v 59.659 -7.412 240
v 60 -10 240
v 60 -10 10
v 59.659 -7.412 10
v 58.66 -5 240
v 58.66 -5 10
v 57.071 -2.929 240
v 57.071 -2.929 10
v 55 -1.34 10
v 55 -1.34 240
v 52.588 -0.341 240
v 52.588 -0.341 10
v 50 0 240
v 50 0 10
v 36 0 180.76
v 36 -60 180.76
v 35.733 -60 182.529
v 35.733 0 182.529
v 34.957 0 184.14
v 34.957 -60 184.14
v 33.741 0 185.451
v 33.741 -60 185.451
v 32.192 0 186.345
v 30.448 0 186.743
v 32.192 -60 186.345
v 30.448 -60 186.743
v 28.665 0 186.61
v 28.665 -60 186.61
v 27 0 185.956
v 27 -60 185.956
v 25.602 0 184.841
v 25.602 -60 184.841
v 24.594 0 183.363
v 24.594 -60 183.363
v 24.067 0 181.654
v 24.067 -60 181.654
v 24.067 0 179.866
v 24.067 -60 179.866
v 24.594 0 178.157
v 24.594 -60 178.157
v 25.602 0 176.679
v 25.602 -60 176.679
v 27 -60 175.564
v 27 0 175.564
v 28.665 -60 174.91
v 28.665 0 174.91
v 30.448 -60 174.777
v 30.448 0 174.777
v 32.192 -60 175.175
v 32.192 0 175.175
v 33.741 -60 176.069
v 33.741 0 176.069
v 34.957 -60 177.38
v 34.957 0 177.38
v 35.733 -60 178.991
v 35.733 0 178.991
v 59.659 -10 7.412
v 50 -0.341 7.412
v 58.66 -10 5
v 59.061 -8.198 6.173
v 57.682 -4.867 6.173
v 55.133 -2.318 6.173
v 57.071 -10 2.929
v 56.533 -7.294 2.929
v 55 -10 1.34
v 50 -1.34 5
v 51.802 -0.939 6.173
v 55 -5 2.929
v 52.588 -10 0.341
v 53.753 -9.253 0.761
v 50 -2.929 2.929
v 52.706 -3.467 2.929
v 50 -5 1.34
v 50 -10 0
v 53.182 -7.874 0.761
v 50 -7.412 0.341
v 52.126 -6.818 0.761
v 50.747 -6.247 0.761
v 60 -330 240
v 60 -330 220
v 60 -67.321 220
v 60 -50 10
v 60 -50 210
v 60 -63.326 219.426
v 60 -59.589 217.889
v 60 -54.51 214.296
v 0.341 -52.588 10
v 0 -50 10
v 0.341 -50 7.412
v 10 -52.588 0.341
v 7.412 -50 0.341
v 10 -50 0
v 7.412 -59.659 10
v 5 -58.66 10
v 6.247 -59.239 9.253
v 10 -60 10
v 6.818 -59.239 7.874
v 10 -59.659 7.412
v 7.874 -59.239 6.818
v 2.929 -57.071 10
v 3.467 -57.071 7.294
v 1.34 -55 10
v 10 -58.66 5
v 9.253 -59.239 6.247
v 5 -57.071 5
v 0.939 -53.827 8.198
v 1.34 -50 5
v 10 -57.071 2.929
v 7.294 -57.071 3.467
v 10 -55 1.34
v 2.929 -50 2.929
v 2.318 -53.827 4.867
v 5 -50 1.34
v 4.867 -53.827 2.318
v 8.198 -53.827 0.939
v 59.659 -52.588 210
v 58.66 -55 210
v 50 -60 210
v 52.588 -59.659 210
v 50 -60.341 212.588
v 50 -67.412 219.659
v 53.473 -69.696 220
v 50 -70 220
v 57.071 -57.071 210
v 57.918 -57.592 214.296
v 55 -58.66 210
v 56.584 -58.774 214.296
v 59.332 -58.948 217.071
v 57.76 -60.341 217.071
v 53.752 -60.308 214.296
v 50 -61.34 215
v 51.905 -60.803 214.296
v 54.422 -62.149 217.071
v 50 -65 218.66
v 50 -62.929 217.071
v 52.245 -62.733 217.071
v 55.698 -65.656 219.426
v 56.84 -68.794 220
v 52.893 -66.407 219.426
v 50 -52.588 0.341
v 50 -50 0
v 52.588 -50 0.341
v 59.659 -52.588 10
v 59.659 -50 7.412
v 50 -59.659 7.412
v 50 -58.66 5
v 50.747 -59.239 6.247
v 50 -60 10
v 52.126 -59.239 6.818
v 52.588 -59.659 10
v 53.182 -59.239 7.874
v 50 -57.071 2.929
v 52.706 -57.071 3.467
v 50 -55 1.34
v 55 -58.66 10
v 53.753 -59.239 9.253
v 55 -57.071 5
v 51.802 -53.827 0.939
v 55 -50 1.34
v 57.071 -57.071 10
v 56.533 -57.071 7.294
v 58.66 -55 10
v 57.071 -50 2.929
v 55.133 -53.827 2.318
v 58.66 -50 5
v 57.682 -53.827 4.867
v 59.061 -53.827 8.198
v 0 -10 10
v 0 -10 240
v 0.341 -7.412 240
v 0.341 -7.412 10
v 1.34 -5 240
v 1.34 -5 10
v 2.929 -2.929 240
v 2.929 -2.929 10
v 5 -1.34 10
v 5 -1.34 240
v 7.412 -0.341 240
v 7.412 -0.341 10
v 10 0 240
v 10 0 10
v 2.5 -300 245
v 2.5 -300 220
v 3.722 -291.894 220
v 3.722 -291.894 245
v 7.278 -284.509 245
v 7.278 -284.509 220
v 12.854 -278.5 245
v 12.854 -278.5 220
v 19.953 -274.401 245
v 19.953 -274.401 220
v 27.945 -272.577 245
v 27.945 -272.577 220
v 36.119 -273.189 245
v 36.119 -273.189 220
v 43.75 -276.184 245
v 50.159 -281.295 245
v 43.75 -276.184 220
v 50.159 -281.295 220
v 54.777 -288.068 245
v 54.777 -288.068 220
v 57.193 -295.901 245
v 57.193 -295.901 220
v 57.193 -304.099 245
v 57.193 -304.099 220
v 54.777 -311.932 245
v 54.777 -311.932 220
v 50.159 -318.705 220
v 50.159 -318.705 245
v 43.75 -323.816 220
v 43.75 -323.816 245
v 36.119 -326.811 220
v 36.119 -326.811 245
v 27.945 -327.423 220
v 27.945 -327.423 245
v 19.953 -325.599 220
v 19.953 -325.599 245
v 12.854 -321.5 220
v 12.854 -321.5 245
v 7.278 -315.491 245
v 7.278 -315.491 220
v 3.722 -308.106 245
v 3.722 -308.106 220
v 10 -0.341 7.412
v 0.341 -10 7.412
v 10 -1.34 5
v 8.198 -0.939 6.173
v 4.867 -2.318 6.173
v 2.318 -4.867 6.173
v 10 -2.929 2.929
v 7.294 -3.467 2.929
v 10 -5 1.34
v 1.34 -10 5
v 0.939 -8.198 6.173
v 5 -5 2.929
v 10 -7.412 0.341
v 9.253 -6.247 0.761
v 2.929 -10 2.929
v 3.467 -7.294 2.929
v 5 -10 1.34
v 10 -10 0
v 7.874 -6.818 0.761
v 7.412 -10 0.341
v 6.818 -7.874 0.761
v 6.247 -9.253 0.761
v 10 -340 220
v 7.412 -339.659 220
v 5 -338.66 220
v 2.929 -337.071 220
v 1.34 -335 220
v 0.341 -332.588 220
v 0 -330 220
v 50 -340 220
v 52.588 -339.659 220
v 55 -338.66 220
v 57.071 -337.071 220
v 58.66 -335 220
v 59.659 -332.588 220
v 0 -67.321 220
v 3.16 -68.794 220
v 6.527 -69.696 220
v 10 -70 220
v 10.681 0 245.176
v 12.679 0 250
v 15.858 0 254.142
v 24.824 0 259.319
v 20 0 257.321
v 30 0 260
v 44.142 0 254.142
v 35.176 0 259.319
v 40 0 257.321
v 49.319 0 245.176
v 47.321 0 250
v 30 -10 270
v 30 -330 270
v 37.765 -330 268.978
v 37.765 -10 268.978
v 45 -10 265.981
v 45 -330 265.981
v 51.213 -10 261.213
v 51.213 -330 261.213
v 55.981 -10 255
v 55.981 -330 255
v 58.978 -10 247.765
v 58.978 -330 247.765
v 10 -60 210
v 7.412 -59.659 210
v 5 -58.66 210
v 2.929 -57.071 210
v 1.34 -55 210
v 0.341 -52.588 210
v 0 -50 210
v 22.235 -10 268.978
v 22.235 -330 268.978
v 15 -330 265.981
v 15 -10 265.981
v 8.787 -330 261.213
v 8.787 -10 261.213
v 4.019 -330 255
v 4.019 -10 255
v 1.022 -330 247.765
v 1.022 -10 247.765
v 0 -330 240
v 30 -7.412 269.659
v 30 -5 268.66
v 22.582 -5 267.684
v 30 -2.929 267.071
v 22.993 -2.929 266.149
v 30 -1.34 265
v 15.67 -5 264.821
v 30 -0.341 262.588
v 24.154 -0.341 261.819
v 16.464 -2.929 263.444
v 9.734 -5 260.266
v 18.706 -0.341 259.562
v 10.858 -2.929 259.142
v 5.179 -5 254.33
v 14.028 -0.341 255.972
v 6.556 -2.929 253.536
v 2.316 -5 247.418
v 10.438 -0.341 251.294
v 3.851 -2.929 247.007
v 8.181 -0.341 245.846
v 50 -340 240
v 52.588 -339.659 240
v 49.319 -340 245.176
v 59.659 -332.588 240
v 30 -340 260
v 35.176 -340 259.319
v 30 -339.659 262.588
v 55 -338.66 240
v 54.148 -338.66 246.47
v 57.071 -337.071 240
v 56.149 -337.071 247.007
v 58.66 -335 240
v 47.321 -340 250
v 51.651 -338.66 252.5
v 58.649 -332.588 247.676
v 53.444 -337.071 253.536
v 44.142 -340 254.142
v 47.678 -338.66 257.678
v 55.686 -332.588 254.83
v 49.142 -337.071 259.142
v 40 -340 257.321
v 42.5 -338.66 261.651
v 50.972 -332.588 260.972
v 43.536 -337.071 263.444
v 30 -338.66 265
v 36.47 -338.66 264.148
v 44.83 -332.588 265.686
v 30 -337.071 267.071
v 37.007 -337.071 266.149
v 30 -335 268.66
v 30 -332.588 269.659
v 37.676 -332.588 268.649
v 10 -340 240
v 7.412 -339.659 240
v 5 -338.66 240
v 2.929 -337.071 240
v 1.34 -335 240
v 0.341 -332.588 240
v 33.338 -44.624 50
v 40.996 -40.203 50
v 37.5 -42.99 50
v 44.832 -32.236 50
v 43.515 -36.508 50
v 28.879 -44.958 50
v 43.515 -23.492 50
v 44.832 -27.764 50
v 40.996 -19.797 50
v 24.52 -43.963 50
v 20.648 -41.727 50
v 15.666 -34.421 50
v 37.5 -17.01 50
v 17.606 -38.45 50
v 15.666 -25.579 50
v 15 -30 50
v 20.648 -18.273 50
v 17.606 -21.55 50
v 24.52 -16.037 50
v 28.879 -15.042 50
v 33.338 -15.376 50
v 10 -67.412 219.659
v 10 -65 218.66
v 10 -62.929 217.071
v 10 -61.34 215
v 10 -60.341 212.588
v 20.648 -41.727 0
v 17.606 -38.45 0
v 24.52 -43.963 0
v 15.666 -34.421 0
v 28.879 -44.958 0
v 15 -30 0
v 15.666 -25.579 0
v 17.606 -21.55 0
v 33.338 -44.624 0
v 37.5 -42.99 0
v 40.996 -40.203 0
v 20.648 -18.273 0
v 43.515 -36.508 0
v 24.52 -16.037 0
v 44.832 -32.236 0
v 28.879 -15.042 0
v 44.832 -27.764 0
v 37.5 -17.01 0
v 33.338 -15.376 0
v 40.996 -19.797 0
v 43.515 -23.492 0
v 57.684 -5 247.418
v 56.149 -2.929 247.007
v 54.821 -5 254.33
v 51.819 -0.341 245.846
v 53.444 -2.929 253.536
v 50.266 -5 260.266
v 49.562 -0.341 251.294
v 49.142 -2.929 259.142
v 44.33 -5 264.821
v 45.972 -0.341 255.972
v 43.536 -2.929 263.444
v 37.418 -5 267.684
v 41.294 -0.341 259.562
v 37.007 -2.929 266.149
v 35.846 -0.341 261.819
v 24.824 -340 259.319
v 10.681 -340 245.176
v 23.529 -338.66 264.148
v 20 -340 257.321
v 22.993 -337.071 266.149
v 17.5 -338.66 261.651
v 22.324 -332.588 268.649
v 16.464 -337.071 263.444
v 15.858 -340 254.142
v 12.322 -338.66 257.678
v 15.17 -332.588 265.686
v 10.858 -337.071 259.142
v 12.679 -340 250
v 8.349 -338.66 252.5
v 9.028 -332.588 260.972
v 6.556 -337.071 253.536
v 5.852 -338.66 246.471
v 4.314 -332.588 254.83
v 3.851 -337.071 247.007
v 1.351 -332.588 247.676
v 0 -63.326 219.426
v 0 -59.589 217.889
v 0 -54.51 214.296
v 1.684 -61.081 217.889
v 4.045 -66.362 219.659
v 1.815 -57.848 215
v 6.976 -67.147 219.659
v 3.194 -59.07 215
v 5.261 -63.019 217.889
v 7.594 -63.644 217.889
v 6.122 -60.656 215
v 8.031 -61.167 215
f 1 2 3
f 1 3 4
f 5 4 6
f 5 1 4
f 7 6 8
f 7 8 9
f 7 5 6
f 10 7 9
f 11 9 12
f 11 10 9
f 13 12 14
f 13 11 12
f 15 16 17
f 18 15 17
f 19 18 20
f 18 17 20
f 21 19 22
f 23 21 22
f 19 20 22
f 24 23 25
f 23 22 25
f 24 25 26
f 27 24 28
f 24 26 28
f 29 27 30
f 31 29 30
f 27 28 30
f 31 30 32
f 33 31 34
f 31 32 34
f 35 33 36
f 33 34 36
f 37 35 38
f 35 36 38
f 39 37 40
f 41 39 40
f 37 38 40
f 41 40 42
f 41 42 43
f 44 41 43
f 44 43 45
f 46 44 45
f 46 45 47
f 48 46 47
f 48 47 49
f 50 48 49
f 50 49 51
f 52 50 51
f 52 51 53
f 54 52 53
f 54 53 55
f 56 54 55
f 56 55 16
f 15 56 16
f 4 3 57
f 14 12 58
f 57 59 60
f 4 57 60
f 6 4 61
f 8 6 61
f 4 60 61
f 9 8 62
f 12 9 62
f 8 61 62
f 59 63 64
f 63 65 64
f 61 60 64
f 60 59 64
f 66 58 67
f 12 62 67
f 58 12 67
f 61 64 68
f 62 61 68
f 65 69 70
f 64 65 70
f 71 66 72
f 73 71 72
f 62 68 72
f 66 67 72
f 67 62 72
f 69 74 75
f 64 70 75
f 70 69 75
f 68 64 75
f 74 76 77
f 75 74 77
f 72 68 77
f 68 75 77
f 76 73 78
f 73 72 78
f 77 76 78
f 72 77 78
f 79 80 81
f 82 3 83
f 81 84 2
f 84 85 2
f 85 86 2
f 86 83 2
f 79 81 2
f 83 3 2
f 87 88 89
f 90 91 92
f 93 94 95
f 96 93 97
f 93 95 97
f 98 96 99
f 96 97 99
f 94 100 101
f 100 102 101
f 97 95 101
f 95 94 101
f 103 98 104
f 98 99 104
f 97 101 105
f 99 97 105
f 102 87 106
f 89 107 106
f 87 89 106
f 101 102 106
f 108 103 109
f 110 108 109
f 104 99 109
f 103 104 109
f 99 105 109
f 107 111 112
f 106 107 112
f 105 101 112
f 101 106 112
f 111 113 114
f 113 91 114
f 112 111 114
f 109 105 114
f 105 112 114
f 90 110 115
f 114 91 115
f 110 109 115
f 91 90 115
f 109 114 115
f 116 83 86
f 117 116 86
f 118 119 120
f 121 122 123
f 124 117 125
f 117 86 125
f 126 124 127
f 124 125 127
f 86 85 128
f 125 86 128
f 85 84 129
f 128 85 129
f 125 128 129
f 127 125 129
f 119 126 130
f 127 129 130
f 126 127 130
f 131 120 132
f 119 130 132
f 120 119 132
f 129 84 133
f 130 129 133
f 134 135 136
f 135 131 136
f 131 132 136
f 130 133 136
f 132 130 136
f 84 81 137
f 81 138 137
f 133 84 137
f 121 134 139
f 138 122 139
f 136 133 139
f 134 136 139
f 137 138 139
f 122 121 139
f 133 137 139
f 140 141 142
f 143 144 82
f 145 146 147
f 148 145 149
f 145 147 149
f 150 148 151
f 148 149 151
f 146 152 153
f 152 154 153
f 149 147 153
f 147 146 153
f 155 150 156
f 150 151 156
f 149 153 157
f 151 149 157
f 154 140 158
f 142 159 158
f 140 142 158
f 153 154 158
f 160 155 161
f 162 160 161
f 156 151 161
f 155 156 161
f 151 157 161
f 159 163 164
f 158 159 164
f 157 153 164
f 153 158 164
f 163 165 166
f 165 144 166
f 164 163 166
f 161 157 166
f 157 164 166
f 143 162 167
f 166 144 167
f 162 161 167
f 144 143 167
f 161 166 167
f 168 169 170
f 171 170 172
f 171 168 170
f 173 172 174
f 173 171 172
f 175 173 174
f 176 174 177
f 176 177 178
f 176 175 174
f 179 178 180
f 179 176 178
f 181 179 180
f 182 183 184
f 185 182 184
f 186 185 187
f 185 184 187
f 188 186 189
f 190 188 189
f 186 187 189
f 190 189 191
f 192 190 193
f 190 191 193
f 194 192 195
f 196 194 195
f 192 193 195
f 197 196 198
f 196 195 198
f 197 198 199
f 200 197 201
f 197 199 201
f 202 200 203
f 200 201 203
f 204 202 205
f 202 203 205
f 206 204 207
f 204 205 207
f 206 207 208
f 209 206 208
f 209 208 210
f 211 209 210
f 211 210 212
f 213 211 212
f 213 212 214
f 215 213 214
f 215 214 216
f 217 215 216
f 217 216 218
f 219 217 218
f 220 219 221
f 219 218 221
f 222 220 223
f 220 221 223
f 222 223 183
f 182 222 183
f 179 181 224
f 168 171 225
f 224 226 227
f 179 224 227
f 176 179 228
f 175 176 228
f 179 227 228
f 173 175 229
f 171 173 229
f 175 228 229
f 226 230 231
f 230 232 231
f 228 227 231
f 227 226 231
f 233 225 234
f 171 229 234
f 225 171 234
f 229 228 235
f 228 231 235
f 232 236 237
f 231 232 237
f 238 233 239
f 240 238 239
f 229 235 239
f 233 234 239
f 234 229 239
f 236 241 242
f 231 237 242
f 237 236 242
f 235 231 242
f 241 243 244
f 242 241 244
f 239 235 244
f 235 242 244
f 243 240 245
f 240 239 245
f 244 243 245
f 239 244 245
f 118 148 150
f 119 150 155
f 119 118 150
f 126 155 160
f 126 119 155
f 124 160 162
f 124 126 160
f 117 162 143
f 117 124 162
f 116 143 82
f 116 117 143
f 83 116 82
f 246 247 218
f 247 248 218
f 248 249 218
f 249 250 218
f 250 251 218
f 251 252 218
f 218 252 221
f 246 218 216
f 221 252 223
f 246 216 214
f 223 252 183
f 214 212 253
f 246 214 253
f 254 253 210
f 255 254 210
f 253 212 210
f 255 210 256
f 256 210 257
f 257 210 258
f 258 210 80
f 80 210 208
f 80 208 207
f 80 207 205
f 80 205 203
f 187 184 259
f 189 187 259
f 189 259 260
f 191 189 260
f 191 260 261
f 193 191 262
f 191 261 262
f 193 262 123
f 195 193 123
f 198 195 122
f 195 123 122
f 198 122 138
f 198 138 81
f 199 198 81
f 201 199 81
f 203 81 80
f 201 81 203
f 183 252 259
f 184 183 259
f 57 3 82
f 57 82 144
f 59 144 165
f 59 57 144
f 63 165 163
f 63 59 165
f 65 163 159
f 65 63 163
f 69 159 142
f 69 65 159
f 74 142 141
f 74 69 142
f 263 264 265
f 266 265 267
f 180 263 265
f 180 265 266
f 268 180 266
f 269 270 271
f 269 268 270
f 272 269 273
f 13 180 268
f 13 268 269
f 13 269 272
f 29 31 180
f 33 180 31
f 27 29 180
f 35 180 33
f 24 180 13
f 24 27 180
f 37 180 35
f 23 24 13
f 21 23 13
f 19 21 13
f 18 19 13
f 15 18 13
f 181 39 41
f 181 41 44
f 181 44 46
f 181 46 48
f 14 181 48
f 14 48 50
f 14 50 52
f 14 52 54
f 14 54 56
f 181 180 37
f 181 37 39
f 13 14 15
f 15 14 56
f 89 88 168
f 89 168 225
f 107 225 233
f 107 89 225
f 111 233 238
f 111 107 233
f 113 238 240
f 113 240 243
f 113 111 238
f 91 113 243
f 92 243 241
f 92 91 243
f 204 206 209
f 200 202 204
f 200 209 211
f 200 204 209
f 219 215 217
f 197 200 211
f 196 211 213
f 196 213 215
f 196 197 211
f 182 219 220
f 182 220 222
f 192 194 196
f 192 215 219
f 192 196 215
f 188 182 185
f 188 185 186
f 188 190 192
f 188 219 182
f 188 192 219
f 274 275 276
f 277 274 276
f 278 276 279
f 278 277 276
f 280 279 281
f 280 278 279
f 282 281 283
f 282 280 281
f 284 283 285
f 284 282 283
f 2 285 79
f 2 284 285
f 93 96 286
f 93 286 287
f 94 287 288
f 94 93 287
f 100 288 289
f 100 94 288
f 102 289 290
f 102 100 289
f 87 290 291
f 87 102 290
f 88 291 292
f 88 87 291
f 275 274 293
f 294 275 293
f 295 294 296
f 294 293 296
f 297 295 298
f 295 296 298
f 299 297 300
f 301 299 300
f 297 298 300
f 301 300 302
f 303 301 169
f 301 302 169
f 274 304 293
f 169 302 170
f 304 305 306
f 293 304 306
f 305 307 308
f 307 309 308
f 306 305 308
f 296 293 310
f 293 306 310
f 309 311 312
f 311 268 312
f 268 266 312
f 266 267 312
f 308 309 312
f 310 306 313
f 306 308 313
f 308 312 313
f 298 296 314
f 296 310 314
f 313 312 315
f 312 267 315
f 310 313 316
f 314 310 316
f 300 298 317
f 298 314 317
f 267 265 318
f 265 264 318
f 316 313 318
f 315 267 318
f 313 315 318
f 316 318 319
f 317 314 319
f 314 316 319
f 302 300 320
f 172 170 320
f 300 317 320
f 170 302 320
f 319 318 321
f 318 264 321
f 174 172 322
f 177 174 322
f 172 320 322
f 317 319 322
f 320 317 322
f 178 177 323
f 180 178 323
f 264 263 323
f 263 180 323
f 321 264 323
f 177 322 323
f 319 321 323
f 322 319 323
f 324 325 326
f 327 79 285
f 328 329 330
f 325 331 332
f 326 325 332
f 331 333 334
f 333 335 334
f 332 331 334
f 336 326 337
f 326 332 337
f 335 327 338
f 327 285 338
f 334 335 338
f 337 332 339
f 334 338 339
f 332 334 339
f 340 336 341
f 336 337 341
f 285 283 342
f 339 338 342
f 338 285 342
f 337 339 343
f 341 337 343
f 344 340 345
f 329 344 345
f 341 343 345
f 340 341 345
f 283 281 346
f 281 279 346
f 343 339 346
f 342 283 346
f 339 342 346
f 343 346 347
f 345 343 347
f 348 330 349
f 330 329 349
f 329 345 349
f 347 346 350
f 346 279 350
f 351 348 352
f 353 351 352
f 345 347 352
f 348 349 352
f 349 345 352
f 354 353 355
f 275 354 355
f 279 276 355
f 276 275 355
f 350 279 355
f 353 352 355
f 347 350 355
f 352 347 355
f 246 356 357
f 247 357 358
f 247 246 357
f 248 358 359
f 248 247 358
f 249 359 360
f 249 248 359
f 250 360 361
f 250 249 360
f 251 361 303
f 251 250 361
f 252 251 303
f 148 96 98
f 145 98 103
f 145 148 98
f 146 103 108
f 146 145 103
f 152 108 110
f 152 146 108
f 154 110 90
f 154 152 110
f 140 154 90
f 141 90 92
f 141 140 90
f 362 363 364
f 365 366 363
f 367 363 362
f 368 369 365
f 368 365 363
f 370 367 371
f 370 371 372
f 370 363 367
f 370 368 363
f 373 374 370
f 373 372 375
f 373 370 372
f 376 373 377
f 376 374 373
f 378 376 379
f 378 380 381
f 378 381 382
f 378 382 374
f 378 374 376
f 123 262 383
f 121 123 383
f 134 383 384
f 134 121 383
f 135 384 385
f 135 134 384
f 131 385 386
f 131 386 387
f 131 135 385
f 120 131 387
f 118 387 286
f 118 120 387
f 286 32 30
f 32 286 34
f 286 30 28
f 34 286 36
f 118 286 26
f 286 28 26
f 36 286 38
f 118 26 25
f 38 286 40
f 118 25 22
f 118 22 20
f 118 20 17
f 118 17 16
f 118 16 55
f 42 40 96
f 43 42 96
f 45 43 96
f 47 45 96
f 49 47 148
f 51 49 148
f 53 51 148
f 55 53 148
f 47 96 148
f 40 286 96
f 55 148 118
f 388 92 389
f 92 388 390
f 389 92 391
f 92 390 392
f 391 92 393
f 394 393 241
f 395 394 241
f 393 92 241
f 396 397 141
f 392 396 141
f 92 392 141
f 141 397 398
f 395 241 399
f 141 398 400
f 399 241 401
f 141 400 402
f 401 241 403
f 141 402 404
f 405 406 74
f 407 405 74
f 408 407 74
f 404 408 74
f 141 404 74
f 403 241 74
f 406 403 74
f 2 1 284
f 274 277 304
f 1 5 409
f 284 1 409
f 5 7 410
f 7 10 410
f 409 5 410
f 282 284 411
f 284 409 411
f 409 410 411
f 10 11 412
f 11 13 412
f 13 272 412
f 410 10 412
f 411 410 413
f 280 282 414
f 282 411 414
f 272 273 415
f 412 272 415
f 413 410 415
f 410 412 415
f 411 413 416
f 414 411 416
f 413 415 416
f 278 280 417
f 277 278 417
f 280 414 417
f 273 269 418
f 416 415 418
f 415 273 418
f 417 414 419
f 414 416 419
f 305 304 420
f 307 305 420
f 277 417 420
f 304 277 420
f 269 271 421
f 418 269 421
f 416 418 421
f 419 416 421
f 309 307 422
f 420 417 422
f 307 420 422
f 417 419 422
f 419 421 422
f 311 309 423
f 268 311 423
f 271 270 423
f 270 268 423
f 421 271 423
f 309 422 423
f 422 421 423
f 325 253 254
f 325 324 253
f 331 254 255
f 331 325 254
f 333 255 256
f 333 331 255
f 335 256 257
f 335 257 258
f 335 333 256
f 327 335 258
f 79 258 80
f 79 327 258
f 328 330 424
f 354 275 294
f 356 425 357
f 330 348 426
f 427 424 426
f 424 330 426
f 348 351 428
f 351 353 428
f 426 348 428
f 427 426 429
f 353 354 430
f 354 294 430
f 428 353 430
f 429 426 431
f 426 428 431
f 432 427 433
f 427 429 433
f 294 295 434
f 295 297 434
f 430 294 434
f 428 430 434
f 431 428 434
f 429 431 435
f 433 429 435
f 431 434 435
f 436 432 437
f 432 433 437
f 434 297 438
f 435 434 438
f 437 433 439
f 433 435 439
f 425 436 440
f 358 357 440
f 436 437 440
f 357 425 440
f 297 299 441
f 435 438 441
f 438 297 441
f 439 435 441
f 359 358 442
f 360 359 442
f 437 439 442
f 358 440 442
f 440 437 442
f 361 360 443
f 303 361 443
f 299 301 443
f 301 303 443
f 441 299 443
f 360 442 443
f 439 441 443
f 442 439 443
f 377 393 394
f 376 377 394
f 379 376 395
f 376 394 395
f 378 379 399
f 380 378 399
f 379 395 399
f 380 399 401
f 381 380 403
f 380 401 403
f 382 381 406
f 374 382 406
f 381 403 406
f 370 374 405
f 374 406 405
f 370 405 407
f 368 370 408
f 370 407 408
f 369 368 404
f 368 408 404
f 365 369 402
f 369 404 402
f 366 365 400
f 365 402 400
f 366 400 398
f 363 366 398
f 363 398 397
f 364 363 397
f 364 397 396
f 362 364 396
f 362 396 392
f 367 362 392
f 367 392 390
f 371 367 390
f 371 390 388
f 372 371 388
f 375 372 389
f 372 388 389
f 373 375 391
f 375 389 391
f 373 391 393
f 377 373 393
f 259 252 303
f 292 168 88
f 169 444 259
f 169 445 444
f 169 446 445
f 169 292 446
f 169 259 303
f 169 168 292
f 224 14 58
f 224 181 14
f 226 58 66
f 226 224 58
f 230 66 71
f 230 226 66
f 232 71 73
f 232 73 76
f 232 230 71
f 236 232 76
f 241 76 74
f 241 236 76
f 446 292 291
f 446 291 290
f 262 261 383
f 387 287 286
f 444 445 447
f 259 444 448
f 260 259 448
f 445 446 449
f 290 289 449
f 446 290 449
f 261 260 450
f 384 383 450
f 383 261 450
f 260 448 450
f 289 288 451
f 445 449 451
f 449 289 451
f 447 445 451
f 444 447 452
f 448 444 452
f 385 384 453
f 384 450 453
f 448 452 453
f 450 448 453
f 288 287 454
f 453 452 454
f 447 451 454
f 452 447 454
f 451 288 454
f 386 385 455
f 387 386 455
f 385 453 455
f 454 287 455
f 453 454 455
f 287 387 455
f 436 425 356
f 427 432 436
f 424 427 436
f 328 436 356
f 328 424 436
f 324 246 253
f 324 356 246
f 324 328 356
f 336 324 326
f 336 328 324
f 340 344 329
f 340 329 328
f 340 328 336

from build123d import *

# Parameters (mm, degrees)
SKETCH1_W           = 60
SKETCH1_H           = 60
BOSS_EXTRUDE1_DEPTH = 270
SKETCH2_W           = 60
SKETCH2_H           = 50
BOSS_EXTRUDE2_DEPTH = 280
SKETCH3_R           = 15
CUT_EXTRUDE1_DEPTH  = 50
SKETCH4_R           = 27.5
CUT_EXTRUDE2_DEPTH  = 25
FILLET1_R           = 30
FILLET2_R           = 30
FILLET3_R           = 10
FILLET4_R           = 10
FILLET5_R           = 10
FILLET6_R           = 10
FILLET7_R           = 10
SKETCH5_R           = 6
CUT_EXTRUDE4_DEPTH  = 394.573373167


# Some blends are built 0.0001 mm under size
with BuildPart() as part:
    # Sketch1 → Boss-Extrude1 (new body)
    with BuildSketch(Plane.XY):
        with Locations((30, -30)):
            Rectangle(SKETCH1_W, SKETCH1_H)
    extrude(amount=BOSS_EXTRUDE1_DEPTH)

    # Sketch2 → Boss-Extrude2 (add)
    with BuildSketch(Plane.XZ.offset(60)):
        with Locations((30, 245)):
            Rectangle(SKETCH2_W, SKETCH2_H)
    extrude(amount=BOSS_EXTRUDE2_DEPTH)

    # Sketch3 → Cut-Extrude1 (cut)
    with BuildSketch(Plane(origin=(0, 0, 0), x_dir=(-1, 0, 0), z_dir=(0, 0, -1))):
        with Locations((-30, -30)):
            Circle(SKETCH3_R)
    extrude(amount=-CUT_EXTRUDE1_DEPTH, mode=Mode.SUBTRACT)

    # Sketch4 → Cut-Extrude2 (cut)
    with BuildSketch(Plane(origin=(0, 0, 220), x_dir=(-1, 0, 0), z_dir=(0, 0, -1))):
        with Locations((-30, -300)):
            Circle(SKETCH4_R)
    extrude(amount=-CUT_EXTRUDE2_DEPTH, mode=Mode.SUBTRACT)

    # Fillet1
    fillet1_edges = [part.edges().sort_by_distance(p)[0] for p in [
        (60, -170, 270),
    ]]
    fillet(fillet1_edges, radius=FILLET1_R)

    # Fillet2
    fillet2_edges = [part.edges().sort_by_distance(p)[0] for p in [
        (0, -170, 270),
    ]]
    fillet(fillet2_edges, radius=FILLET2_R - 0.0001)  # a hair under: the kernel refuses the full size

    # Fillet3
    fillet3_edges = [part.edges().sort_by_distance(p)[0] for p in [
        (60, 0, 120),
        (51.213203436, 0, 261.213203436),
        (0, 0, 120.00005),
        (8.786767275, 0, 261.213232725),
    ]]
    fillet(fillet3_edges, radius=FILLET3_R)

    # Fillet4
    fillet4_edges = [part.edges().sort_by_distance(p)[0] for p in [
        (60, -35, 0),
        (30, 0, 0),
        (0, -35, 0),
        (2.928932188, -2.928932188, 0),
        (57.071067812, -2.928932188, 0),
    ]]
    fillet(fillet4_edges, radius=FILLET4_R)

    # Fillet5
    fillet5_edges = [part.edges().sort_by_distance(p)[0] for p in [
        (60, -60, 115),
        (0, -60, 115),
        (30, -60, 0),
        (2.928932188, -60, 2.928932188),
        (57.071067812, -60, 2.928932188),
    ]]
    fillet(fillet5_edges, radius=FILLET5_R)

    # Fillet6
    # the kernel refuses this fillet: 10 mm, written as the material it adds along each edge
    with BuildSketch(Plane(origin=(50, -60, 220), x_dir=(0, 0, -1), z_dir=(-1, 0, 0))) as fillet6_piece_1:
        with BuildLine():
            CenterArc((FILLET6_R, FILLET6_R), FILLET6_R, 180, 90)
            Line((0, FILLET6_R), (0, 0))
            Line((0, 0), (FILLET6_R, 0))
        make_face()
    extrude(amount=40)
    with BuildSketch(Plane(origin=(50, -50, 220), x_dir=(-0.8017442392976486, 0.5976672776328272, 0), z_dir=(-0.5976672776328272, -0.8017442392976486, 0))) as fillet6_piece_2_section:
        with BuildLine():
            CenterArc((10 + FILLET6_R, FILLET6_R), FILLET6_R, 180, 90)
            Line((10 + FILLET6_R, 0), (10, 0))
            Line((10, 0), (10, FILLET6_R))
        make_face()
    fillet6_piece_2 = revolve(axis=Axis((50, -50, 220), (0, 0, -1)), revolution_arc=233.296989237, mode=Mode.PRIVATE)
    fillet6_piece_2 = split(fillet6_piece_2, bisect_by=Plane(origin=(60, -57.499389328, 216.883716878), z_dir=(-1, 0, 0)), keep=Keep.TOP, mode=Mode.PRIVATE)
    add(fillet6_piece_2)
    with BuildSketch(Plane(origin=(10, -50, 220), x_dir=(0.8017442392976489, 0.5976672776328267, 0), z_dir=(0.5976672776328267, -0.8017442392976489, 0))) as fillet6_piece_3_section:
        with BuildLine():
            CenterArc((10 + FILLET6_R, -FILLET6_R), FILLET6_R, 90, 90)
            Line((10, -FILLET6_R), (10, 0))
            Line((10, 0), (10 + FILLET6_R, 0))
        make_face()
    fillet6_piece_3 = revolve(axis=Axis((10, -50, 220), (0, 0, 1)), revolution_arc=233.296989237, mode=Mode.PRIVATE)
    fillet6_piece_3 = split(fillet6_piece_3, bisect_by=Plane(origin=(0, -57.499389357, 216.883716675), z_dir=(1, 0, 0)), keep=Keep.TOP, mode=Mode.PRIVATE)
    add(fillet6_piece_3)

    # Fillet7
    fillet7_edges = [part.edges().sort_by_distance(p)[0] for p in [
        (60, -340, 230),
        (51.213203436, -340, 261.213203436),
        (0, -340, 230.00005),
        (8.786767275, -340, 261.213232725),
    ]]
    fillet(fillet7_edges, radius=FILLET7_R)

    # Sketch5 → Cut-Extrude4 (cut, through all)
    with BuildSketch(Plane.XZ.offset(60)):
        with Locations((30, 180.76)):
            Circle(SKETCH5_R)
    extrude(amount=-CUT_EXTRUDE4_DEPTH, mode=Mode.SUBTRACT)


solid = part.part
